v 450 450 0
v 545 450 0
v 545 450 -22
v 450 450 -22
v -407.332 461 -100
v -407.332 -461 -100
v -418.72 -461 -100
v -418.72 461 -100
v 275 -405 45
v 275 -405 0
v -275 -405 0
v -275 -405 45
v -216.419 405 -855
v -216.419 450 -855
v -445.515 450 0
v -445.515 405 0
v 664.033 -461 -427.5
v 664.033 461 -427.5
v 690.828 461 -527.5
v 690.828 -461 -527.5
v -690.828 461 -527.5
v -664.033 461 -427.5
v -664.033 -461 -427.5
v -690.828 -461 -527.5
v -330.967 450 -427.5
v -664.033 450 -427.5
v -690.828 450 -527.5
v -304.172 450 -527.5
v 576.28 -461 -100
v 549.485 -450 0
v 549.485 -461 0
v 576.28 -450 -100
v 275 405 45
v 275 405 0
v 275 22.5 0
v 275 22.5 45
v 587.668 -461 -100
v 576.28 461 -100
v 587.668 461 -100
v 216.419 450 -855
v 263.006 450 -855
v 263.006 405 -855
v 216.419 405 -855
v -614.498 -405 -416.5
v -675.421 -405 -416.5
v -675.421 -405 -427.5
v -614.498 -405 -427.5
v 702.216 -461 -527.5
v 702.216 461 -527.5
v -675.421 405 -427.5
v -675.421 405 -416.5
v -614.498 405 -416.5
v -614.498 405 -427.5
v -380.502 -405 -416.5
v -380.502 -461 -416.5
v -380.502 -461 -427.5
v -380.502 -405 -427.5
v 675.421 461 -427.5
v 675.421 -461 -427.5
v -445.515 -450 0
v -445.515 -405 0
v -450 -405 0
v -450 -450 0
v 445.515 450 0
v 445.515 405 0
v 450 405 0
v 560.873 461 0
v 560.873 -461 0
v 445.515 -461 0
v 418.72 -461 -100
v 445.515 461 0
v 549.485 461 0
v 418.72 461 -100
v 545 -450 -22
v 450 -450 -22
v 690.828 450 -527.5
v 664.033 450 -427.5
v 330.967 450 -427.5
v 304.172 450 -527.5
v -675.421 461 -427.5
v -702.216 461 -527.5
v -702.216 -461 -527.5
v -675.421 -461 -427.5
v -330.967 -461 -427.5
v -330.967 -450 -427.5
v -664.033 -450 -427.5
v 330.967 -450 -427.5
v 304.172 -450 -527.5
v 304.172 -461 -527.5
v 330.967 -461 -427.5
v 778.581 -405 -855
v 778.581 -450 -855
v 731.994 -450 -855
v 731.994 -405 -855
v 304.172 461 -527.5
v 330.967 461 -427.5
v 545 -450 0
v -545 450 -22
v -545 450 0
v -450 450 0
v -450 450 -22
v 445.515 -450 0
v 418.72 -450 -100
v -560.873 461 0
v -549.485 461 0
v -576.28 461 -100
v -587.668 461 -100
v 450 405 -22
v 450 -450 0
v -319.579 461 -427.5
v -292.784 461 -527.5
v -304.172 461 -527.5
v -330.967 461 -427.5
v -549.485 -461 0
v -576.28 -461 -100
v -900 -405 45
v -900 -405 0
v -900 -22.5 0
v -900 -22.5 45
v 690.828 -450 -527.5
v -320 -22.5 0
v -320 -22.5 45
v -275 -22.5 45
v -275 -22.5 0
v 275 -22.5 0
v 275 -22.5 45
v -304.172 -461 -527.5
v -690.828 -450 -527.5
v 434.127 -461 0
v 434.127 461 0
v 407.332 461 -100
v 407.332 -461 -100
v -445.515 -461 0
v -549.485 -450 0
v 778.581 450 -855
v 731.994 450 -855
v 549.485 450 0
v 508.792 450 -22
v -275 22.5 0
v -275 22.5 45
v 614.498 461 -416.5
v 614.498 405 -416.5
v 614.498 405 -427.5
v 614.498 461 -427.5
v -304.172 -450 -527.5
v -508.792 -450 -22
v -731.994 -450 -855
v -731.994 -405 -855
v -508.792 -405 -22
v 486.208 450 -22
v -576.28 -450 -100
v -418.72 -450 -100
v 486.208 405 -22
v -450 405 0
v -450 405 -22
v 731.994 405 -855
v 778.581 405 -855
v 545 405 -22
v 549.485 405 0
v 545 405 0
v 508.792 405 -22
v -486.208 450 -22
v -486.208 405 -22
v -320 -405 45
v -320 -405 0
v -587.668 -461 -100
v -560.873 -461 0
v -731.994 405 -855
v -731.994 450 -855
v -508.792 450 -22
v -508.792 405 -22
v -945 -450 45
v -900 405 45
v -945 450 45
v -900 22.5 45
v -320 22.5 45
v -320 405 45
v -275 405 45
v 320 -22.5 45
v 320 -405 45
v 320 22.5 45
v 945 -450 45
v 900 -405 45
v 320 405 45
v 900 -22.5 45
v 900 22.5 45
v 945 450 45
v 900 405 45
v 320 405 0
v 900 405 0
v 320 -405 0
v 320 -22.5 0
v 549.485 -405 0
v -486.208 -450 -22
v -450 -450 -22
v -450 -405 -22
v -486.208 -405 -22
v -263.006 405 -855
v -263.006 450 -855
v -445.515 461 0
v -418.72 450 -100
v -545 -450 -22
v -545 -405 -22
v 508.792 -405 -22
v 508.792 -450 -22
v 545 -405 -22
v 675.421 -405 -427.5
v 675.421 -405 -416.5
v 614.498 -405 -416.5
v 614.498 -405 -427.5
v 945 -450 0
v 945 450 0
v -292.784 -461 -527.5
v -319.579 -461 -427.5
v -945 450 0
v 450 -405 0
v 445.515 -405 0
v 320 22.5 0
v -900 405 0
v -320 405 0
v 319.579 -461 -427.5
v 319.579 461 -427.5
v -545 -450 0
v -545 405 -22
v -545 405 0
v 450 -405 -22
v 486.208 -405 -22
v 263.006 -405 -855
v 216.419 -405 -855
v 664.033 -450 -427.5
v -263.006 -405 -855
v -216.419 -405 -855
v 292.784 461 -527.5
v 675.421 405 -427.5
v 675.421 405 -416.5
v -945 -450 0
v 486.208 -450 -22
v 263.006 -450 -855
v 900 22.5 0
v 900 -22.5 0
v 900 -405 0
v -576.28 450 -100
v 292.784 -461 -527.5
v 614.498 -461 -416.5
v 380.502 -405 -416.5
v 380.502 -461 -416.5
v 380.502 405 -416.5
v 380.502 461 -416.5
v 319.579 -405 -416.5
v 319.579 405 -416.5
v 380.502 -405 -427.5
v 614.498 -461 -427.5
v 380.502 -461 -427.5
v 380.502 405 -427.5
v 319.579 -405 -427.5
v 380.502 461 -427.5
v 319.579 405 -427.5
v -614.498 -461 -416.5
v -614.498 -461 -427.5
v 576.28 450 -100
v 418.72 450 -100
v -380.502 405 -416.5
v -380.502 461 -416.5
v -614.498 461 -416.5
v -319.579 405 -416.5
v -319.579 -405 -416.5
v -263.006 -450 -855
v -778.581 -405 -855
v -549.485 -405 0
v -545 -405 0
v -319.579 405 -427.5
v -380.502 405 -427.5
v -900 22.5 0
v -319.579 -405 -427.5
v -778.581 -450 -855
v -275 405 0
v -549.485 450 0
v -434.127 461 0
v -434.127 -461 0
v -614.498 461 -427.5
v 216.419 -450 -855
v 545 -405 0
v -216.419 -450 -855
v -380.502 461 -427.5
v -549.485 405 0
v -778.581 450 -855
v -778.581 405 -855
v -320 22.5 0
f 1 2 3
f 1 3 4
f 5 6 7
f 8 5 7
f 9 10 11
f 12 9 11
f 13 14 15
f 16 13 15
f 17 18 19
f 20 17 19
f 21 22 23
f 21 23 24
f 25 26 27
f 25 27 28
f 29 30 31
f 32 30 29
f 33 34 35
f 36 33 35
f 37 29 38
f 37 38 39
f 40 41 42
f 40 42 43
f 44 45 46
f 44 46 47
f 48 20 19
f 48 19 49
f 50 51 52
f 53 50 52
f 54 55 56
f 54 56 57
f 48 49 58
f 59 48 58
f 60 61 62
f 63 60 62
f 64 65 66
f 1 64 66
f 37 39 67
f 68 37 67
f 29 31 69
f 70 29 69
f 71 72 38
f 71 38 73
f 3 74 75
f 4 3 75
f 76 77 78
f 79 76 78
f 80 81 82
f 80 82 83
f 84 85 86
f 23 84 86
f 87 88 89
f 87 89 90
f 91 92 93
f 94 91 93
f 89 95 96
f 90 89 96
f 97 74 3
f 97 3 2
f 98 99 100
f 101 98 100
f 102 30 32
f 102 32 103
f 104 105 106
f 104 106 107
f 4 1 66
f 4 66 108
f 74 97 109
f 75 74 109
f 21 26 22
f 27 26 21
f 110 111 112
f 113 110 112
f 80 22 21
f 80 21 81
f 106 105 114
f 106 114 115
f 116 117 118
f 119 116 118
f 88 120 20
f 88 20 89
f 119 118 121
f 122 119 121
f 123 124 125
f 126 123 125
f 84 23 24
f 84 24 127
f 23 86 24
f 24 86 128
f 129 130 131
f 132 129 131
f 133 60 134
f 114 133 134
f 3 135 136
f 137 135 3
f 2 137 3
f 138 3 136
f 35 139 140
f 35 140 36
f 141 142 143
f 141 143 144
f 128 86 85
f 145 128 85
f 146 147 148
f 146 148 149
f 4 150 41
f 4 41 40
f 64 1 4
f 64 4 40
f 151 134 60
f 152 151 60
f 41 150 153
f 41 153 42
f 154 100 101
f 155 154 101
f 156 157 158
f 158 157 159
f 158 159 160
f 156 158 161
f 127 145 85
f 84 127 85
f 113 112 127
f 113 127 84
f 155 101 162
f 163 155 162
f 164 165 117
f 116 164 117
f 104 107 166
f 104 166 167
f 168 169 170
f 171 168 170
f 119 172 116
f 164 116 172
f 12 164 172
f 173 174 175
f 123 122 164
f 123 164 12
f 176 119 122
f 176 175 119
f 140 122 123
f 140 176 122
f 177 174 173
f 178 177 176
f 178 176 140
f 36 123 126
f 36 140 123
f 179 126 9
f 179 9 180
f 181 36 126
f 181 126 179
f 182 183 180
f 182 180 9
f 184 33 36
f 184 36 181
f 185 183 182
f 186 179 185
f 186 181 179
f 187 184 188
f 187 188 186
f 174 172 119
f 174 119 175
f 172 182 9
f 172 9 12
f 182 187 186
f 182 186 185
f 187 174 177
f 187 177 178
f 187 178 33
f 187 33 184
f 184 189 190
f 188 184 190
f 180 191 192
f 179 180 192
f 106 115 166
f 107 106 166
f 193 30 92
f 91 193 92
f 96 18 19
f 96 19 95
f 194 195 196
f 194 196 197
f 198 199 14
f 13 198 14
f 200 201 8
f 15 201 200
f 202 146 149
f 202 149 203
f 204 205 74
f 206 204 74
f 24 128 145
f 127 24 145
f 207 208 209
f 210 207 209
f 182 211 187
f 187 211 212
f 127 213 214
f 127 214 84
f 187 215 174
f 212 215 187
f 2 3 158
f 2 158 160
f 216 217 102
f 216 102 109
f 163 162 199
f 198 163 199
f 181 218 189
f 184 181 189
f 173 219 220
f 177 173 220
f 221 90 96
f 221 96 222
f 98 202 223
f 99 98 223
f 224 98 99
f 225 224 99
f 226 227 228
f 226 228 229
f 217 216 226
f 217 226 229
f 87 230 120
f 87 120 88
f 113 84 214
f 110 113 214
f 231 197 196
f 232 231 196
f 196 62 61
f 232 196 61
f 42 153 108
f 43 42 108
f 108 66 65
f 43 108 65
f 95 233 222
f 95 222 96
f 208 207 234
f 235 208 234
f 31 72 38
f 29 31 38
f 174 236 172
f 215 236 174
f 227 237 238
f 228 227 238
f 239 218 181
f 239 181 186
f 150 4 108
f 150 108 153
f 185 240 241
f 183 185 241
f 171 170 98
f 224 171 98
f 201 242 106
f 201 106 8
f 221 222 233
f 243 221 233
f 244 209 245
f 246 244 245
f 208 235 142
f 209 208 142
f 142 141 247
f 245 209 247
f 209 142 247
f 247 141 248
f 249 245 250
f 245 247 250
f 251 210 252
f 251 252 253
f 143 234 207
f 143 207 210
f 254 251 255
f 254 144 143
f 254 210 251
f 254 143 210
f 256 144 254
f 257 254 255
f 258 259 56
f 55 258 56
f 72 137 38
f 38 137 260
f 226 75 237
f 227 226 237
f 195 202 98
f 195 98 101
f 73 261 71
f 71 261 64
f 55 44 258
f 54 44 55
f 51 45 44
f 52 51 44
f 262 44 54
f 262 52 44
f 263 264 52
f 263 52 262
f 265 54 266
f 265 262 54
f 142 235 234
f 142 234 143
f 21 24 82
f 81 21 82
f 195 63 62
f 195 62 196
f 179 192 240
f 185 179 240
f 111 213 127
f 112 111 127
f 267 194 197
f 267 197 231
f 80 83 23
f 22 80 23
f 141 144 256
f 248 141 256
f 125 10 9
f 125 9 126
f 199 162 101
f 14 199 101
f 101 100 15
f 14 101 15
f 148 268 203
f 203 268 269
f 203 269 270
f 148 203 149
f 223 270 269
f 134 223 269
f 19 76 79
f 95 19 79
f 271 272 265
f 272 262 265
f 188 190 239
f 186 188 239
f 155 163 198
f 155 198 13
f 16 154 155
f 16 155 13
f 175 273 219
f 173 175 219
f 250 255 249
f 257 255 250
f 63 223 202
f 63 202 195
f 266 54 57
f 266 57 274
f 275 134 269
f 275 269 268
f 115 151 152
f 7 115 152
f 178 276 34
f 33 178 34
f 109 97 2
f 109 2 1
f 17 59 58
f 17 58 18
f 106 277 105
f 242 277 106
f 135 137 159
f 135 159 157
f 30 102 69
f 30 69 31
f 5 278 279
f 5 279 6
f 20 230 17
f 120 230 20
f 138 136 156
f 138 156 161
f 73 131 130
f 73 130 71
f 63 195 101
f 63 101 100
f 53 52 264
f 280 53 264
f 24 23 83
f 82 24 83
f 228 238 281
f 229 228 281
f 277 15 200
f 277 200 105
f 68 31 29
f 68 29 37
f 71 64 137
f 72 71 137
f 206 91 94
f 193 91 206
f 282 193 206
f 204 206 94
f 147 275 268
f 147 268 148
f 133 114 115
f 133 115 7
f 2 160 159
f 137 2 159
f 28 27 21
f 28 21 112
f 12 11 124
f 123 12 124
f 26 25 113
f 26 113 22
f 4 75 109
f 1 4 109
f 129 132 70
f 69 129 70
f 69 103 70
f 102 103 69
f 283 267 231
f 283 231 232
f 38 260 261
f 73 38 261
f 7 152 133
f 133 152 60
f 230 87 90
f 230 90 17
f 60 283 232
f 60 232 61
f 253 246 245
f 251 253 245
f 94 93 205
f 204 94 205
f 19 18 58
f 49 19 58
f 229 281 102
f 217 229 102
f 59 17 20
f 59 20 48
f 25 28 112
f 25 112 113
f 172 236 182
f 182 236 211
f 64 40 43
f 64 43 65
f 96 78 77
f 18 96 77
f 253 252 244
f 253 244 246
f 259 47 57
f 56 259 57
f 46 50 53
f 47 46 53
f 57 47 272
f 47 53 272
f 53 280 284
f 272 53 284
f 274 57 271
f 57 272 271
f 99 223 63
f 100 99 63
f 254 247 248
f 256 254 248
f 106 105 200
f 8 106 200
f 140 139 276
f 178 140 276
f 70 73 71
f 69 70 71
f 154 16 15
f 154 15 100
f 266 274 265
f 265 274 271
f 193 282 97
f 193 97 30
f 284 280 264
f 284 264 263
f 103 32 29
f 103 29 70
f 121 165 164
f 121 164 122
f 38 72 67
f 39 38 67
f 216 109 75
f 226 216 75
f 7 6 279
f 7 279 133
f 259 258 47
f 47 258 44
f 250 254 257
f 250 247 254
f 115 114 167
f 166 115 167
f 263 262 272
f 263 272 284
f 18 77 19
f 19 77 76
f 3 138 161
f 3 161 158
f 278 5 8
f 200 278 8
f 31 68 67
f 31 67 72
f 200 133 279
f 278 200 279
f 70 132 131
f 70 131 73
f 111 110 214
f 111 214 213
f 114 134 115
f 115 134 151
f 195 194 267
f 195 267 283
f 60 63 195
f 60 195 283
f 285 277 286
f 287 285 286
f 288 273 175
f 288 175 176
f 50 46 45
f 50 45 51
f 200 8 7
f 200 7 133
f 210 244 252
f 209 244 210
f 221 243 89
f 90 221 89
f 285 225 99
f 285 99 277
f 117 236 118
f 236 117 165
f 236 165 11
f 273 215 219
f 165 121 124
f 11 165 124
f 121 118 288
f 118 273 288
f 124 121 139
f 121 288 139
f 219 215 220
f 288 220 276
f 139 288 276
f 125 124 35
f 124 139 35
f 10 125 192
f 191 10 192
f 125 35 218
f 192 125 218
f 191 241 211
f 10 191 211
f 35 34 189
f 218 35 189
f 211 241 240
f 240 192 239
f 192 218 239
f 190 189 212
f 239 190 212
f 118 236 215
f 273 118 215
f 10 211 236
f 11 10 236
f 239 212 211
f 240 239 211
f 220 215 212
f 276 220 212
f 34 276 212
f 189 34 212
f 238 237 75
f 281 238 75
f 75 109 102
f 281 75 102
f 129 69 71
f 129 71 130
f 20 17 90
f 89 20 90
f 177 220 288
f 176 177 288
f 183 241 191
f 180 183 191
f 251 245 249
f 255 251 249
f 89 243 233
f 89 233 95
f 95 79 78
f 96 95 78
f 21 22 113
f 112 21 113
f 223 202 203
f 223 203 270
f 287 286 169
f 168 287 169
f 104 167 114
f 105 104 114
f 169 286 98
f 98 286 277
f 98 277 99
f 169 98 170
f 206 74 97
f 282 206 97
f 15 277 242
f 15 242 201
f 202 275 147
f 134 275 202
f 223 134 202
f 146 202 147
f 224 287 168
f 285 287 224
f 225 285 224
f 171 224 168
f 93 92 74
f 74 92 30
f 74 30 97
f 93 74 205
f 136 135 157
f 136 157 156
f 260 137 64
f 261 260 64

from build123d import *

# Parameters (mm, degrees)
F0_W      = 1890
F0_H      = 900
F0_W_2    = 45
F0_H_2    = 382.5
F0_W_3    = 580
F0_H_3    = 45
F0_W_4    = 550
F1_DEPTH  = 45
F2_W      = 95
F2_H      = 22
F3_DEPTH  = 900
F5_DEPTH  = 45
F7_DEPTH  = 11
F10_DEPTH = 922
F11_W     = 355.8419104132
F11_H     = 922
F12_DEPTH = 11
F14_W     = 80.4998734839
F14_H     = 84.9716675282
F14_W_2   = 86.1553862937
F14_H_2   = 108.1925344467
F14_W_3   = 84.9872687705
F14_H_3   = 77.3259413242
F14_W_4   = 99.3894949801
F14_H_4   = 102.0654153824
F15_DEPTH = 438.501


# Not quite as in the source:
# - a feature names something its author has since deleted; it is built from what else it names


with BuildPart() as f1:
    # F0 (on Top) → F1 (new body)
    with BuildSketch(Plane.XY):
        Rectangle(F0_W, F0_H)
        Polygon((320, 405), (900, 405), (900, 22.5), (900, -22.5), (900, -405), (320, -405), (275, -405), (-275, -405), (-320, -405), (-900, -405), (-900, -22.5), (-900, 22.5), (-900, 405), (-320, 405), (-275, 405), (275, 405), align=None, mode=Mode.SUBTRACT)
        with Locations((297.5, 213.75)):
            Rectangle(F0_W_2, F0_H_2)
        with Locations((610, 0)):
            Rectangle(F0_W_3, F0_H_3)
        with Locations((297.5, 0)):
            Rectangle(F0_W_2, F0_H_3)
        with Locations((-297.5, 213.75)):
            Rectangle(F0_W_2, F0_H_2)
        Rectangle(F0_W_4, F0_H_3)
        with Locations((297.5, -213.75)):
            Rectangle(F0_W_2, F0_H_2)
        with Locations((-297.5, 0)):
            Rectangle(F0_W_2, F0_H_3)
        with Locations((-610, 0)):
            Rectangle(F0_W_3, F0_H_3)
        with Locations((-297.5, -213.75)):
            Rectangle(F0_W_2, F0_H_2)
    extrude(amount=F1_DEPTH)


with BuildPart() as f3:
    # F2 (on face) → F3 (new body, through all)
    with BuildSketch(Plane.XZ.offset(450)):
        with Locations((-497.5, -11)):
            Rectangle(F2_W, F2_H)
    extrude(amount=-F3_DEPTH)


with BuildPart() as f5:
    # F4 (on face) → F5 (new body)
    with BuildSketch(Plane.XZ.offset(450)):
        Polygon((-545, 0), (-549.4846374578, 0), (-778.5811969864, -855), (-731.9937688679, -855), (-508.7920915728, -22), (-545, -22), align=None)
    extrude(amount=-F5_DEPTH)


with BuildPart() as f5b:
    # F4 (on face) → F5, piece 2 (new body)
    with BuildSketch(Plane.XZ.offset(450)):
        Polygon((-450, 0), (-450, -22), (-486.2079084272, -22), (-263.0062311321, -855), (-216.4188030136, -855), (-445.5153625422, 0), align=None)
    extrude(amount=-F5_DEPTH)


with BuildPart() as f7:
    # F6 (on face) → F7 (new body)
    with BuildSketch(Plane.XZ.offset(450)):
        Polygon((-330.9670827779, -427.5), (-664.0329172221, -427.5), (-690.8278364652, -527.5), (-304.1721635348, -527.5), align=None)
    extrude(amount=F7_DEPTH)


with BuildPart() as f7b:
    # F6 (on face) → F7, piece 2 (new body)
    with BuildSketch(Plane.XZ.offset(450)):
        Polygon((-445.5153625422, 0), (-549.4846374578, 0), (-576.2795567009, -100), (-418.7204432991, -100), align=None)
    extrude(amount=F7_DEPTH)


with BuildPart() as f8_1:
    # F8: instance of F5
    add(f5.part.mirror(Plane.XZ))


with BuildPart() as f8_2:
    # F8: instance of F5b
    add(f5b.part.mirror(Plane.XZ))


with BuildPart() as f8_3:
    # F8: instance of F7
    add(f7.part.mirror(Plane.XZ))


with BuildPart() as f8_4:
    # F8: instance of F7b
    add(f7b.part.mirror(Plane.XZ))


with BuildPart() as f10:
    # F9 (on face) → F10 (new body, through all)
    with BuildSketch(Plane(origin=(0, 461, 0), x_dir=(-1, 0, 0), z_dir=(0, 1, 0))):
        Polygon((418.7204432991, -100), (445.5153625422, 0), (434.1273245577, 0), (407.3324053146, -100), align=None)
    extrude(amount=-F10_DEPTH)


with BuildPart() as f10b:
    # F9 (on face) → F10, piece 2 (new body, through all)
    with BuildSketch(Plane(origin=(0, 461, 0), x_dir=(-1, 0, 0), z_dir=(0, 1, 0))):
        Polygon((560.8726754423, 0), (549.4846374578, 0), (576.2795567009, -100), (587.6675946854, -100), align=None)
    extrude(amount=-F10_DEPTH)


with BuildPart() as f10c:
    # F9 (on face) → F10, piece 3 (new body, through all)
    with BuildSketch(Plane(origin=(0, 461, 0), x_dir=(-1, 0, 0), z_dir=(0, 1, 0))):
        Polygon((304.1721635348, -527.5), (330.9670827779, -427.5), (319.5790447934, -427.5), (292.7841255503, -527.5), align=None)
    extrude(amount=-F10_DEPTH)


with BuildPart() as f10d:
    # F9 (on face) → F10, piece 4 (new body, through all)
    with BuildSketch(Plane(origin=(0, 461, 0), x_dir=(-1, 0, 0), z_dir=(0, 1, 0))):
        Polygon((675.4209552066, -427.5), (664.0329172221, -427.5), (690.8278364652, -527.5), (702.2158744497, -527.5), align=None)
    extrude(amount=-F10_DEPTH)


with BuildPart() as f12:
    # F11 (on face) → F12 (new body)
    with BuildSketch(Plane.XY.offset(-427.5)):
        with Locations((-497.5, 0)):
            Rectangle(F11_W, F11_H)
    extrude(amount=F12_DEPTH)

    # F13: cut F5, F5b, F8_1, F8_2
    add(f5.part, mode=Mode.SUBTRACT)
    add(f5b.part, mode=Mode.SUBTRACT)
    add(f8_1.part, mode=Mode.SUBTRACT)
    add(f8_2.part, mode=Mode.SUBTRACT)

    # F14 (on face) → F15 (cut, through all)
    with BuildSketch(Plane.XY.offset(-416.5)):
        with Locations((-654.7479847288, -447.4858337641)):
            Rectangle(F14_W, F14_H)
        with Locations((-337.4242588663, -459.0962672234)):
            Rectangle(F14_W_2, F14_H_2)
        with Locations((-656.9916823721, 443.6629706621)):
            Rectangle(F14_W_3, F14_H_3)
        with Locations((-330.8072045231, 456.0327076912)):
            Rectangle(F14_W_4, F14_H_4)
    extrude(amount=-F15_DEPTH, mode=Mode.SUBTRACT)


with BuildPart() as f16_1:
    # F16: instance of F5b
    add(f5b.part.mirror(Plane.YZ))


with BuildPart() as f16_2:
    # F16: instance of F5
    add(f5.part.mirror(Plane.YZ))


with BuildPart() as f16_3:
    # F16: instance of F3
    add(f3.part.mirror(Plane.YZ))


with BuildPart() as f16_4:
    # F16: instance of F8_3
    add(f8_3.part.mirror(Plane.YZ))


with BuildPart() as f16_5:
    # F16: instance of F8_1
    add(f8_1.part.mirror(Plane.YZ))


with BuildPart() as f16_6:
    # F16: instance of F8_2
    add(f8_2.part.mirror(Plane.YZ))


with BuildPart() as f16_7:
    # F16: instance of F8_4
    add(f8_4.part.mirror(Plane.YZ))


with BuildPart() as f16_8:
    # F16: instance of F7
    add(f7.part.mirror(Plane.YZ))


with BuildPart() as f16_9:
    # F16: instance of F7b
    add(f7b.part.mirror(Plane.YZ))


with BuildPart() as f16_10:
    # F16: instance of F12
    add(f12.part.mirror(Plane.YZ))


with BuildPart() as f16_11:
    # F16: instance of F10d
    add(f10d.part.mirror(Plane.YZ))


with BuildPart() as f16_12:
    # F16: instance of F10c
    add(f10c.part.mirror(Plane.YZ))


with BuildPart() as f16_13:
    # F16: instance of F10b
    add(f10b.part.mirror(Plane.YZ))


with BuildPart() as f16_14:
    # F16: instance of F10
    add(f10.part.mirror(Plane.YZ))


solid = Compound([f1.part, f3.part, f5.part, f5b.part, f7.part, f7b.part, f8_1.part, f8_2.part, f8_3.part, f8_4.part, f10.part, f10b.part, f10c.part, f10d.part, f12.part, f16_1.part, f16_2.part, f16_3.part, f16_4.part, f16_5.part, f16_6.part, f16_7.part, f16_8.part, f16_9.part, f16_10.part, f16_11.part, f16_12.part, f16_13.part, f16_14.part])
